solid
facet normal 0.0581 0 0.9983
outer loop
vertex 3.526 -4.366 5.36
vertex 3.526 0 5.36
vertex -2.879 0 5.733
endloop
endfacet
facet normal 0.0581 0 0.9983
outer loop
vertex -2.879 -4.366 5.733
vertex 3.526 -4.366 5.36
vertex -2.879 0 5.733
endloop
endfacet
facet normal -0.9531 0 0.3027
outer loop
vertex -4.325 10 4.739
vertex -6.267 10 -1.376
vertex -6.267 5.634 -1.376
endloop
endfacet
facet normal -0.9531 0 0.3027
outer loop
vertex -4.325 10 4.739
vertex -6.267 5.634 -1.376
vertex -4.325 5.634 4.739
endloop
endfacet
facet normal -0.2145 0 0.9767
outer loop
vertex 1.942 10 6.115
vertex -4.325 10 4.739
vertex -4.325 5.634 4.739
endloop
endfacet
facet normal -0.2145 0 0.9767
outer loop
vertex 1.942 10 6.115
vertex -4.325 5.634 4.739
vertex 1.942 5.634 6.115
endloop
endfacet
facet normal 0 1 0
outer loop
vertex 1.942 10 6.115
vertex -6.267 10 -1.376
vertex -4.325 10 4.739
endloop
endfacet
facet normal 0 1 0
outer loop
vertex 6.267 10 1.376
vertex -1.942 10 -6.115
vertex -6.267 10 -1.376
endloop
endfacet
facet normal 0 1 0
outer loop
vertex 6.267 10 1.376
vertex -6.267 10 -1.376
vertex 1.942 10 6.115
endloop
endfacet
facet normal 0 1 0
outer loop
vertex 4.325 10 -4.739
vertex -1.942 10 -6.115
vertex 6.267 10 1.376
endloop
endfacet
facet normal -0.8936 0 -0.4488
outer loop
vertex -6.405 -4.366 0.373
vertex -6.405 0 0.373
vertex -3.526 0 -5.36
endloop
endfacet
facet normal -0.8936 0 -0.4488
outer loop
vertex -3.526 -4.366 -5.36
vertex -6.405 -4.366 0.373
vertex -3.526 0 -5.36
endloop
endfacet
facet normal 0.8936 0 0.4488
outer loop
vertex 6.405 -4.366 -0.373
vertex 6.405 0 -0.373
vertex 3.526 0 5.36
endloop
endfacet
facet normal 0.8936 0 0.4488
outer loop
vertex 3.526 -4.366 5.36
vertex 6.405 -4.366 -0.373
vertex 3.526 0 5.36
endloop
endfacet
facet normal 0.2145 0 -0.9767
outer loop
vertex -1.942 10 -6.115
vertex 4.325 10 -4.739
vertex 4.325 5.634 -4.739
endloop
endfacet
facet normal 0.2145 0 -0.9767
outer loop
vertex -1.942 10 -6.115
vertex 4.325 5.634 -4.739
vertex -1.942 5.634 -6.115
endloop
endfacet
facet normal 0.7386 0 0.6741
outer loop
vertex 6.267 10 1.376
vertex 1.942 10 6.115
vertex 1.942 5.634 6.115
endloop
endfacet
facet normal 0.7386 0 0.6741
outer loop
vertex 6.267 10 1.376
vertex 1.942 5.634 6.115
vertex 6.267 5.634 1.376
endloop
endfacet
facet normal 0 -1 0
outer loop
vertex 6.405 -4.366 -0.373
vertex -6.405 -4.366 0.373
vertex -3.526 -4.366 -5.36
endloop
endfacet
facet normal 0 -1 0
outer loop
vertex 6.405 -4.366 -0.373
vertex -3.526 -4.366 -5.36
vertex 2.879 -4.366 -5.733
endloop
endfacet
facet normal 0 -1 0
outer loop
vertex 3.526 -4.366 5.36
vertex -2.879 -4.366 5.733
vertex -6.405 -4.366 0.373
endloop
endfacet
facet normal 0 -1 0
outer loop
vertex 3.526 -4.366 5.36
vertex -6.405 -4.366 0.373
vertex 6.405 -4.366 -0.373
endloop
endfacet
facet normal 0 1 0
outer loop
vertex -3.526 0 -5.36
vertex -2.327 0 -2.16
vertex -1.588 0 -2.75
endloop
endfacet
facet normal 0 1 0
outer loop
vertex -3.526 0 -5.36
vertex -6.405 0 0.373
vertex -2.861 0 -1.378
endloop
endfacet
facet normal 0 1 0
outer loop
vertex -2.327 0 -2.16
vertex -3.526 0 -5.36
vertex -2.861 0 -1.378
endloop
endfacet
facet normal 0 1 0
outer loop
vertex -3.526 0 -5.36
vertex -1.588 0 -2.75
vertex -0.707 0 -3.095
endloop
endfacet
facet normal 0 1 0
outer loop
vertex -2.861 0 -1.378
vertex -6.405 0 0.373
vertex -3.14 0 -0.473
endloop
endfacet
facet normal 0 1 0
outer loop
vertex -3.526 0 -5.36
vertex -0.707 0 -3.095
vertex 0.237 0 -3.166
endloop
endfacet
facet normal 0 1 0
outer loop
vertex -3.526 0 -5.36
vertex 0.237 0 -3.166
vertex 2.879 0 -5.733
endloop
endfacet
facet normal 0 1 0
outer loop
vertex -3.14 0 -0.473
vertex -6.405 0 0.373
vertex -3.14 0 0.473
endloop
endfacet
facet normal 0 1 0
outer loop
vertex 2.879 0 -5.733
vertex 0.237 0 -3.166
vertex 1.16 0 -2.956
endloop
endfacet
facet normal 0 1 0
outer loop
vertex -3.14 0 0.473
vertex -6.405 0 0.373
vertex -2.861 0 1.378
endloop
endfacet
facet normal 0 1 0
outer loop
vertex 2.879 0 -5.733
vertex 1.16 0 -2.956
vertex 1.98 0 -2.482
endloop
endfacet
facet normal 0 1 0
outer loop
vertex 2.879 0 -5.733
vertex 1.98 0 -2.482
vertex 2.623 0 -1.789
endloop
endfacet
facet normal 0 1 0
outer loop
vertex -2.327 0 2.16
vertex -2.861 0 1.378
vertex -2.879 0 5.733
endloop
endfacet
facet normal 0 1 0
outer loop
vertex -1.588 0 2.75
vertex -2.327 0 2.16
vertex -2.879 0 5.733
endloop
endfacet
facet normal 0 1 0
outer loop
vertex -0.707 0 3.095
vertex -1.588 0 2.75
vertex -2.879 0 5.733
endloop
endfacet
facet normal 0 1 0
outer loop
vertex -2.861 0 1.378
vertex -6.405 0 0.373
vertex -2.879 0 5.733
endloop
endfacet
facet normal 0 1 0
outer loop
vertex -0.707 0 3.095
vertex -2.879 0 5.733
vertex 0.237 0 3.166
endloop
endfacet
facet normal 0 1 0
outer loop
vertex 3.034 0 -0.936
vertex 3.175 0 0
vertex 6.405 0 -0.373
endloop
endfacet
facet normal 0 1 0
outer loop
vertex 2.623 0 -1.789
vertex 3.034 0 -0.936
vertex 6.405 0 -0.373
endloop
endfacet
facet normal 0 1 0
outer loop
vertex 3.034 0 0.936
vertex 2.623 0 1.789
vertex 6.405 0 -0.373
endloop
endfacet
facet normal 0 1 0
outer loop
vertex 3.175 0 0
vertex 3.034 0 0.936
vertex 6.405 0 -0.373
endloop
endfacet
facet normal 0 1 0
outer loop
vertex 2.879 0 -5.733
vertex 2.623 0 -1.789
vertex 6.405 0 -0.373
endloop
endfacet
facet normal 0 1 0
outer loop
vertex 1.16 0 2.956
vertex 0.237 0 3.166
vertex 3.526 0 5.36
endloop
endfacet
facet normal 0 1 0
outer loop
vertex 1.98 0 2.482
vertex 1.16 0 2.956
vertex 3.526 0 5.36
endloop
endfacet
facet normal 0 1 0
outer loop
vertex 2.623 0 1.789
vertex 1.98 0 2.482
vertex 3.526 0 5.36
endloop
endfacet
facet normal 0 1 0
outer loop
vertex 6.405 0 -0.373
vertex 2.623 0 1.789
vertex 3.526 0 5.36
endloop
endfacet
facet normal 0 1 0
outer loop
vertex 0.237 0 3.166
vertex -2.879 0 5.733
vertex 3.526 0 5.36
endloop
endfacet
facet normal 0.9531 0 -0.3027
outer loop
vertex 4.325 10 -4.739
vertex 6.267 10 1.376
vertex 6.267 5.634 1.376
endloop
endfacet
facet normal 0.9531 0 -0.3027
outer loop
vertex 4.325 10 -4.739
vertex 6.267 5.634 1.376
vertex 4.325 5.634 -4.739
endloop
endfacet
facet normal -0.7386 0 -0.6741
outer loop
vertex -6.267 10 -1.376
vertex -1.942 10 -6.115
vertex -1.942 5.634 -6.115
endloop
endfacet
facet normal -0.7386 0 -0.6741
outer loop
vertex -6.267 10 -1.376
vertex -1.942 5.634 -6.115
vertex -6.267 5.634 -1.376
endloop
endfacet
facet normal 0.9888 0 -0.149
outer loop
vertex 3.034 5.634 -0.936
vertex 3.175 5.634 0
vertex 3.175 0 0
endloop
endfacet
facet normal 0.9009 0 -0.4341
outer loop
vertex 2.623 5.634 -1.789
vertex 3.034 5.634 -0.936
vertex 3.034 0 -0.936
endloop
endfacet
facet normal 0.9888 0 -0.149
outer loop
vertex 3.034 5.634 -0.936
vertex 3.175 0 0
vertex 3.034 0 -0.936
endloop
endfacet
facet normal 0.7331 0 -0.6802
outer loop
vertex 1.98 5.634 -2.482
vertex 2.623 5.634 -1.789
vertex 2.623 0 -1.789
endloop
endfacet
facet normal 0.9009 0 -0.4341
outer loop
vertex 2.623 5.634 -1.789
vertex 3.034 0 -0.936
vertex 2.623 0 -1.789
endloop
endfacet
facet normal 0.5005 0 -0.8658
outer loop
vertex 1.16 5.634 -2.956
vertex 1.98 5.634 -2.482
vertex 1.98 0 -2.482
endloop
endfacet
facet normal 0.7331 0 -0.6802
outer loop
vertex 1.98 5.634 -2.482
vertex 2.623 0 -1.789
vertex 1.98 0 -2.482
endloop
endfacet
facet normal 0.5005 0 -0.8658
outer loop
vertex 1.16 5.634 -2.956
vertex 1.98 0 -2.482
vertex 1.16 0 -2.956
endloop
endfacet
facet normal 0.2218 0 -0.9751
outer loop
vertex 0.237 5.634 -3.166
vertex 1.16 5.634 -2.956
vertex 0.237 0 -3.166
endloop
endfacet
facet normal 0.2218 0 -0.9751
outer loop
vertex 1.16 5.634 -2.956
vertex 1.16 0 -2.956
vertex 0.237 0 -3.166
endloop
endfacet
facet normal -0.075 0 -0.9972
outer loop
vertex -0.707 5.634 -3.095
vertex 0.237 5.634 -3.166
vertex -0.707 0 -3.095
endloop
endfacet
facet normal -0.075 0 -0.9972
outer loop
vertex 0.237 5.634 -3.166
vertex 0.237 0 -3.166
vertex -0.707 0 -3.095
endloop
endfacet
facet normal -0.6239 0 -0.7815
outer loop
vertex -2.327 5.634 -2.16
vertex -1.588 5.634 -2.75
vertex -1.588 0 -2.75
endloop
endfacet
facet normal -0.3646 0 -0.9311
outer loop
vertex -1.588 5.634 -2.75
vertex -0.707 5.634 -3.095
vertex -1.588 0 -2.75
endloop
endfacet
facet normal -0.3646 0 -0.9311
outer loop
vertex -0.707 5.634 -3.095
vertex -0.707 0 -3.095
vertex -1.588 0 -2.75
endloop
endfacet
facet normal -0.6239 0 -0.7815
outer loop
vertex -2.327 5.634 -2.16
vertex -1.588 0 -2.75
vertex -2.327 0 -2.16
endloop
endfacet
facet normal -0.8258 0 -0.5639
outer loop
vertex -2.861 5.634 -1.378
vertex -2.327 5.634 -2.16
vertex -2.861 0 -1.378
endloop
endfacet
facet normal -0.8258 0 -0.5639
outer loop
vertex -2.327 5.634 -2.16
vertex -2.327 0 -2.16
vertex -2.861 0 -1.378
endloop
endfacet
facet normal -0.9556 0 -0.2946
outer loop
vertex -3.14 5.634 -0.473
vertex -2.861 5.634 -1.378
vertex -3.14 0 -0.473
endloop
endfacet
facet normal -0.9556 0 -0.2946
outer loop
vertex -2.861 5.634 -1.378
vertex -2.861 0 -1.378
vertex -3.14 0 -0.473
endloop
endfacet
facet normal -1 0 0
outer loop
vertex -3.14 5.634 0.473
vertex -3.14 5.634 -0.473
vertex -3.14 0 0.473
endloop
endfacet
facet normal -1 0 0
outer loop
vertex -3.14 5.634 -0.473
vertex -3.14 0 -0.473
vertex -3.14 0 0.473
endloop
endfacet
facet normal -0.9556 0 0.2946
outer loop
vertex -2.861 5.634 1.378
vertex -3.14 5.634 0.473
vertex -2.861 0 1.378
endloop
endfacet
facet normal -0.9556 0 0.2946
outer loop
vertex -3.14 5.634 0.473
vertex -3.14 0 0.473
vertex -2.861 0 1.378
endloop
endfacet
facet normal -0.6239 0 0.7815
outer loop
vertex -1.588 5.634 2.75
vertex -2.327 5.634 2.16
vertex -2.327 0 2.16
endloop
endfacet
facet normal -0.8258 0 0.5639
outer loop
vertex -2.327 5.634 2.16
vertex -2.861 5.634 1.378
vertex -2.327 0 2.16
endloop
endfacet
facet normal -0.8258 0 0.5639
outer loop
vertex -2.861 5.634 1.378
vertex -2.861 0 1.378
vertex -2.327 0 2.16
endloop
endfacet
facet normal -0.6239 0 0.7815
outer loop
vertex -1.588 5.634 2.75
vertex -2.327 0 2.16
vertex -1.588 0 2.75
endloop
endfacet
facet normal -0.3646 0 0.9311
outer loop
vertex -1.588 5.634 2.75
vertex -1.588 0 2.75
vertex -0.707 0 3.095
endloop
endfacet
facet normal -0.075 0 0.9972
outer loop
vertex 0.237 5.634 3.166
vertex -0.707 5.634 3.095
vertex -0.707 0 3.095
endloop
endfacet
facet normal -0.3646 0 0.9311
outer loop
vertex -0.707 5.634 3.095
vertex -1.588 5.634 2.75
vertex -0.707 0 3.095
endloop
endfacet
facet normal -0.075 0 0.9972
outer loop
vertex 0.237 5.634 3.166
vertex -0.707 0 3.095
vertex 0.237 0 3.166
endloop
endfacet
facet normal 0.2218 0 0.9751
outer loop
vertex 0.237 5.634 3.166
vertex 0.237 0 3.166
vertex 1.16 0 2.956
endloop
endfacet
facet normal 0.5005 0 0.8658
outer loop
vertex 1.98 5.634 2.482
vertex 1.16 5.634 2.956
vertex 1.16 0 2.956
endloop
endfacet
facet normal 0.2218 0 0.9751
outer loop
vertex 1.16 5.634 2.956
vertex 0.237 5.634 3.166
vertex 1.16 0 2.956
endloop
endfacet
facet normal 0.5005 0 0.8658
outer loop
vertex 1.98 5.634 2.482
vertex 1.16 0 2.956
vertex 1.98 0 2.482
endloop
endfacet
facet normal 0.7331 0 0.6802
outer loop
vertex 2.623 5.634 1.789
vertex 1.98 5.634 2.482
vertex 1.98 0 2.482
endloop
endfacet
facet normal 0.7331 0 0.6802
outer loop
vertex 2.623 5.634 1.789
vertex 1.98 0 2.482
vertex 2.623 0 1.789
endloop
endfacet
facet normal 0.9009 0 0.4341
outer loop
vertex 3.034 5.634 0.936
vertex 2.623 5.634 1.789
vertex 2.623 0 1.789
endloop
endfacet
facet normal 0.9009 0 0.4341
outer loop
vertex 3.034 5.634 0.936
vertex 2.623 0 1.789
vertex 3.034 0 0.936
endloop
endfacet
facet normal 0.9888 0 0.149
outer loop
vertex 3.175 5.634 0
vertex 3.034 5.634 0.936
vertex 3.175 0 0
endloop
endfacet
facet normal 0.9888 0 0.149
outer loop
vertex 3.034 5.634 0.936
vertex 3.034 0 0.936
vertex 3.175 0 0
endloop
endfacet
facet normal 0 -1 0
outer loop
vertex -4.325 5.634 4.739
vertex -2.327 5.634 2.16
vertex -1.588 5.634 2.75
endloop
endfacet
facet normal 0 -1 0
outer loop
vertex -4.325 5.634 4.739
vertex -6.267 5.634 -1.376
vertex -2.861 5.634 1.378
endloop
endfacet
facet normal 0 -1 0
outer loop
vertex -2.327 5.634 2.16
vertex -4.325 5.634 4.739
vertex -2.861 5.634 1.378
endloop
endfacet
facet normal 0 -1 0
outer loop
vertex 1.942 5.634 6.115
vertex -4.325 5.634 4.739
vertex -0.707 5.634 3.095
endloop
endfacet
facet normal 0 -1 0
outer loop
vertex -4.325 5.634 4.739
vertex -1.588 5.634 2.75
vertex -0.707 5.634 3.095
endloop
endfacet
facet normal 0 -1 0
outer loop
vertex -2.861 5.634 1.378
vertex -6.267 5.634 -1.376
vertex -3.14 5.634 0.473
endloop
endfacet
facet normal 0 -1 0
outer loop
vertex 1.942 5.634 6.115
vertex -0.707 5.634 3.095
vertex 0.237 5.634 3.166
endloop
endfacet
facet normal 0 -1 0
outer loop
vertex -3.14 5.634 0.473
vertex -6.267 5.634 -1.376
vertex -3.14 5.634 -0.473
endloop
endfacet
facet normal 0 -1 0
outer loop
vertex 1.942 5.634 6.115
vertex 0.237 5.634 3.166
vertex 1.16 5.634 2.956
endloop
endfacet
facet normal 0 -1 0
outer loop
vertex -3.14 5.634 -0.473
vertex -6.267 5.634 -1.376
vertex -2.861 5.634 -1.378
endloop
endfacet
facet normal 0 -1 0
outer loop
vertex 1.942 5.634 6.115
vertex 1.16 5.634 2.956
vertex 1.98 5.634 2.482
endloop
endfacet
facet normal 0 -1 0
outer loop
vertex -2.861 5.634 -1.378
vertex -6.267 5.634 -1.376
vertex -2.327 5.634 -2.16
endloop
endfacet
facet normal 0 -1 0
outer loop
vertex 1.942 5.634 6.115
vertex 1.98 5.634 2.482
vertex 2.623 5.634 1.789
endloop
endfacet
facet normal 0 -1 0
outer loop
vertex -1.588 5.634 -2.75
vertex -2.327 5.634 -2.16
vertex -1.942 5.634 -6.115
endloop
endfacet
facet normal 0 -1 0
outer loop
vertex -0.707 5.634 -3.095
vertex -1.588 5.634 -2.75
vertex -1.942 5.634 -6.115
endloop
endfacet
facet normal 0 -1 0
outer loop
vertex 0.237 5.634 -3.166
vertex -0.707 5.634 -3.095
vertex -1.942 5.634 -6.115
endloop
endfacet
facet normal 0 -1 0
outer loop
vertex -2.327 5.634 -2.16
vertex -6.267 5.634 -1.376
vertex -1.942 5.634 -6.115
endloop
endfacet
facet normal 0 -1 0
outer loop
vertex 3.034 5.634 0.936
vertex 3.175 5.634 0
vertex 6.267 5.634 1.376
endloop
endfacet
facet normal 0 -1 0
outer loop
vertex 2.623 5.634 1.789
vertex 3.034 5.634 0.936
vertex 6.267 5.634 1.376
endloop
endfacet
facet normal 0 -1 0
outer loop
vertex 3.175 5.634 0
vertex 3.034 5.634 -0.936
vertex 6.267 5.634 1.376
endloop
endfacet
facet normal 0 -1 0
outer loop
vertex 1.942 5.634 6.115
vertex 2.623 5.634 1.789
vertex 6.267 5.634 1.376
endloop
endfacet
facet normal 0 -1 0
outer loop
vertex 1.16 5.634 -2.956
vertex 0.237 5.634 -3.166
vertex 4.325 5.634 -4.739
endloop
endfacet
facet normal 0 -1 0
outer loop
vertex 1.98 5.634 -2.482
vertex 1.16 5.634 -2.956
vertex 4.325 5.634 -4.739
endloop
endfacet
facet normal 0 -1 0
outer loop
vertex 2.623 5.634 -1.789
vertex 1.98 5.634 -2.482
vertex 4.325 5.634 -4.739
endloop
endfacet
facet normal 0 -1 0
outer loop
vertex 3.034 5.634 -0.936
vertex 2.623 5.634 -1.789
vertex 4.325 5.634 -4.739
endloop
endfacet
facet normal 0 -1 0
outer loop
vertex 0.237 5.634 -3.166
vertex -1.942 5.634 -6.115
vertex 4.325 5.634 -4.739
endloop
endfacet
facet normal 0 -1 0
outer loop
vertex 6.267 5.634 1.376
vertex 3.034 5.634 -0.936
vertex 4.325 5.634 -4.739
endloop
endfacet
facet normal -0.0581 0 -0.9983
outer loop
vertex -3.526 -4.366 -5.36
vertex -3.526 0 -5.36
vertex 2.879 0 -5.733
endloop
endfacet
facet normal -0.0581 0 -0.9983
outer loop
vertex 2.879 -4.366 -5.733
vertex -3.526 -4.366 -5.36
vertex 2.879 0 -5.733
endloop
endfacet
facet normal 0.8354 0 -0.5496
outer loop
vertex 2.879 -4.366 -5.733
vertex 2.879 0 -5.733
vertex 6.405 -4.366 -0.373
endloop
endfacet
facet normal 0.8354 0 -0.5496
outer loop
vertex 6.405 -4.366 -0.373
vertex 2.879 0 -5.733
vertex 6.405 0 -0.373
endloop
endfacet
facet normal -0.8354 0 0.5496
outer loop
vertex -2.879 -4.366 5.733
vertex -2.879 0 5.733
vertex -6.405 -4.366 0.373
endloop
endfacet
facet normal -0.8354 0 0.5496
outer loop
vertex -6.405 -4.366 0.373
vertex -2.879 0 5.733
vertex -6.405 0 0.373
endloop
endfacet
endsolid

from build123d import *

# Parameters (mm, degrees)
SKETCH1_R           = 3.175
BOSS_EXTRUDE1_DEPTH = 10
BOSS_EXTRUDE2_DEPTH = 4.365625
BOSS_EXTRUDE3_DEPTH = 4.365625


with BuildPart() as part:
    # Sketch1 → Boss-Extrude1 (new body)
    with BuildSketch(Plane(origin=(0, 0, 0), x_dir=(1, 0, 0), z_dir=(0, 1, 0))):
        Circle(SKETCH1_R)
    extrude(amount=BOSS_EXTRUDE1_DEPTH)

    # Sketch2 → Boss-Extrude2 (add)
    with BuildSketch(Plane.XZ):
        Polygon((6.404947556, -0.373093671), (3.525582375, 5.360300458), (-2.879365181, 5.733394129), (-6.404947556, 0.373093671), (-3.525582375, -5.360300458), (2.879365181, -5.733394129), align=None)
    extrude(amount=BOSS_EXTRUDE2_DEPTH)

    # Sketch3 → Boss-Extrude3 (add)
    with BuildSketch(Plane(origin=(0, 10, 0), x_dir=(1, 0, 0), z_dir=(0, 1, 0))):
        Polygon((-6.266509765, 1.376011426), (-4.324915734, -4.738950937), (1.941594032, -6.114962363), (6.266509765, -1.376011426), (4.324915734, 4.738950937), (-1.941594032, 6.114962363), align=None)
    extrude(amount=-BOSS_EXTRUDE3_DEPTH)


solid = part.part
